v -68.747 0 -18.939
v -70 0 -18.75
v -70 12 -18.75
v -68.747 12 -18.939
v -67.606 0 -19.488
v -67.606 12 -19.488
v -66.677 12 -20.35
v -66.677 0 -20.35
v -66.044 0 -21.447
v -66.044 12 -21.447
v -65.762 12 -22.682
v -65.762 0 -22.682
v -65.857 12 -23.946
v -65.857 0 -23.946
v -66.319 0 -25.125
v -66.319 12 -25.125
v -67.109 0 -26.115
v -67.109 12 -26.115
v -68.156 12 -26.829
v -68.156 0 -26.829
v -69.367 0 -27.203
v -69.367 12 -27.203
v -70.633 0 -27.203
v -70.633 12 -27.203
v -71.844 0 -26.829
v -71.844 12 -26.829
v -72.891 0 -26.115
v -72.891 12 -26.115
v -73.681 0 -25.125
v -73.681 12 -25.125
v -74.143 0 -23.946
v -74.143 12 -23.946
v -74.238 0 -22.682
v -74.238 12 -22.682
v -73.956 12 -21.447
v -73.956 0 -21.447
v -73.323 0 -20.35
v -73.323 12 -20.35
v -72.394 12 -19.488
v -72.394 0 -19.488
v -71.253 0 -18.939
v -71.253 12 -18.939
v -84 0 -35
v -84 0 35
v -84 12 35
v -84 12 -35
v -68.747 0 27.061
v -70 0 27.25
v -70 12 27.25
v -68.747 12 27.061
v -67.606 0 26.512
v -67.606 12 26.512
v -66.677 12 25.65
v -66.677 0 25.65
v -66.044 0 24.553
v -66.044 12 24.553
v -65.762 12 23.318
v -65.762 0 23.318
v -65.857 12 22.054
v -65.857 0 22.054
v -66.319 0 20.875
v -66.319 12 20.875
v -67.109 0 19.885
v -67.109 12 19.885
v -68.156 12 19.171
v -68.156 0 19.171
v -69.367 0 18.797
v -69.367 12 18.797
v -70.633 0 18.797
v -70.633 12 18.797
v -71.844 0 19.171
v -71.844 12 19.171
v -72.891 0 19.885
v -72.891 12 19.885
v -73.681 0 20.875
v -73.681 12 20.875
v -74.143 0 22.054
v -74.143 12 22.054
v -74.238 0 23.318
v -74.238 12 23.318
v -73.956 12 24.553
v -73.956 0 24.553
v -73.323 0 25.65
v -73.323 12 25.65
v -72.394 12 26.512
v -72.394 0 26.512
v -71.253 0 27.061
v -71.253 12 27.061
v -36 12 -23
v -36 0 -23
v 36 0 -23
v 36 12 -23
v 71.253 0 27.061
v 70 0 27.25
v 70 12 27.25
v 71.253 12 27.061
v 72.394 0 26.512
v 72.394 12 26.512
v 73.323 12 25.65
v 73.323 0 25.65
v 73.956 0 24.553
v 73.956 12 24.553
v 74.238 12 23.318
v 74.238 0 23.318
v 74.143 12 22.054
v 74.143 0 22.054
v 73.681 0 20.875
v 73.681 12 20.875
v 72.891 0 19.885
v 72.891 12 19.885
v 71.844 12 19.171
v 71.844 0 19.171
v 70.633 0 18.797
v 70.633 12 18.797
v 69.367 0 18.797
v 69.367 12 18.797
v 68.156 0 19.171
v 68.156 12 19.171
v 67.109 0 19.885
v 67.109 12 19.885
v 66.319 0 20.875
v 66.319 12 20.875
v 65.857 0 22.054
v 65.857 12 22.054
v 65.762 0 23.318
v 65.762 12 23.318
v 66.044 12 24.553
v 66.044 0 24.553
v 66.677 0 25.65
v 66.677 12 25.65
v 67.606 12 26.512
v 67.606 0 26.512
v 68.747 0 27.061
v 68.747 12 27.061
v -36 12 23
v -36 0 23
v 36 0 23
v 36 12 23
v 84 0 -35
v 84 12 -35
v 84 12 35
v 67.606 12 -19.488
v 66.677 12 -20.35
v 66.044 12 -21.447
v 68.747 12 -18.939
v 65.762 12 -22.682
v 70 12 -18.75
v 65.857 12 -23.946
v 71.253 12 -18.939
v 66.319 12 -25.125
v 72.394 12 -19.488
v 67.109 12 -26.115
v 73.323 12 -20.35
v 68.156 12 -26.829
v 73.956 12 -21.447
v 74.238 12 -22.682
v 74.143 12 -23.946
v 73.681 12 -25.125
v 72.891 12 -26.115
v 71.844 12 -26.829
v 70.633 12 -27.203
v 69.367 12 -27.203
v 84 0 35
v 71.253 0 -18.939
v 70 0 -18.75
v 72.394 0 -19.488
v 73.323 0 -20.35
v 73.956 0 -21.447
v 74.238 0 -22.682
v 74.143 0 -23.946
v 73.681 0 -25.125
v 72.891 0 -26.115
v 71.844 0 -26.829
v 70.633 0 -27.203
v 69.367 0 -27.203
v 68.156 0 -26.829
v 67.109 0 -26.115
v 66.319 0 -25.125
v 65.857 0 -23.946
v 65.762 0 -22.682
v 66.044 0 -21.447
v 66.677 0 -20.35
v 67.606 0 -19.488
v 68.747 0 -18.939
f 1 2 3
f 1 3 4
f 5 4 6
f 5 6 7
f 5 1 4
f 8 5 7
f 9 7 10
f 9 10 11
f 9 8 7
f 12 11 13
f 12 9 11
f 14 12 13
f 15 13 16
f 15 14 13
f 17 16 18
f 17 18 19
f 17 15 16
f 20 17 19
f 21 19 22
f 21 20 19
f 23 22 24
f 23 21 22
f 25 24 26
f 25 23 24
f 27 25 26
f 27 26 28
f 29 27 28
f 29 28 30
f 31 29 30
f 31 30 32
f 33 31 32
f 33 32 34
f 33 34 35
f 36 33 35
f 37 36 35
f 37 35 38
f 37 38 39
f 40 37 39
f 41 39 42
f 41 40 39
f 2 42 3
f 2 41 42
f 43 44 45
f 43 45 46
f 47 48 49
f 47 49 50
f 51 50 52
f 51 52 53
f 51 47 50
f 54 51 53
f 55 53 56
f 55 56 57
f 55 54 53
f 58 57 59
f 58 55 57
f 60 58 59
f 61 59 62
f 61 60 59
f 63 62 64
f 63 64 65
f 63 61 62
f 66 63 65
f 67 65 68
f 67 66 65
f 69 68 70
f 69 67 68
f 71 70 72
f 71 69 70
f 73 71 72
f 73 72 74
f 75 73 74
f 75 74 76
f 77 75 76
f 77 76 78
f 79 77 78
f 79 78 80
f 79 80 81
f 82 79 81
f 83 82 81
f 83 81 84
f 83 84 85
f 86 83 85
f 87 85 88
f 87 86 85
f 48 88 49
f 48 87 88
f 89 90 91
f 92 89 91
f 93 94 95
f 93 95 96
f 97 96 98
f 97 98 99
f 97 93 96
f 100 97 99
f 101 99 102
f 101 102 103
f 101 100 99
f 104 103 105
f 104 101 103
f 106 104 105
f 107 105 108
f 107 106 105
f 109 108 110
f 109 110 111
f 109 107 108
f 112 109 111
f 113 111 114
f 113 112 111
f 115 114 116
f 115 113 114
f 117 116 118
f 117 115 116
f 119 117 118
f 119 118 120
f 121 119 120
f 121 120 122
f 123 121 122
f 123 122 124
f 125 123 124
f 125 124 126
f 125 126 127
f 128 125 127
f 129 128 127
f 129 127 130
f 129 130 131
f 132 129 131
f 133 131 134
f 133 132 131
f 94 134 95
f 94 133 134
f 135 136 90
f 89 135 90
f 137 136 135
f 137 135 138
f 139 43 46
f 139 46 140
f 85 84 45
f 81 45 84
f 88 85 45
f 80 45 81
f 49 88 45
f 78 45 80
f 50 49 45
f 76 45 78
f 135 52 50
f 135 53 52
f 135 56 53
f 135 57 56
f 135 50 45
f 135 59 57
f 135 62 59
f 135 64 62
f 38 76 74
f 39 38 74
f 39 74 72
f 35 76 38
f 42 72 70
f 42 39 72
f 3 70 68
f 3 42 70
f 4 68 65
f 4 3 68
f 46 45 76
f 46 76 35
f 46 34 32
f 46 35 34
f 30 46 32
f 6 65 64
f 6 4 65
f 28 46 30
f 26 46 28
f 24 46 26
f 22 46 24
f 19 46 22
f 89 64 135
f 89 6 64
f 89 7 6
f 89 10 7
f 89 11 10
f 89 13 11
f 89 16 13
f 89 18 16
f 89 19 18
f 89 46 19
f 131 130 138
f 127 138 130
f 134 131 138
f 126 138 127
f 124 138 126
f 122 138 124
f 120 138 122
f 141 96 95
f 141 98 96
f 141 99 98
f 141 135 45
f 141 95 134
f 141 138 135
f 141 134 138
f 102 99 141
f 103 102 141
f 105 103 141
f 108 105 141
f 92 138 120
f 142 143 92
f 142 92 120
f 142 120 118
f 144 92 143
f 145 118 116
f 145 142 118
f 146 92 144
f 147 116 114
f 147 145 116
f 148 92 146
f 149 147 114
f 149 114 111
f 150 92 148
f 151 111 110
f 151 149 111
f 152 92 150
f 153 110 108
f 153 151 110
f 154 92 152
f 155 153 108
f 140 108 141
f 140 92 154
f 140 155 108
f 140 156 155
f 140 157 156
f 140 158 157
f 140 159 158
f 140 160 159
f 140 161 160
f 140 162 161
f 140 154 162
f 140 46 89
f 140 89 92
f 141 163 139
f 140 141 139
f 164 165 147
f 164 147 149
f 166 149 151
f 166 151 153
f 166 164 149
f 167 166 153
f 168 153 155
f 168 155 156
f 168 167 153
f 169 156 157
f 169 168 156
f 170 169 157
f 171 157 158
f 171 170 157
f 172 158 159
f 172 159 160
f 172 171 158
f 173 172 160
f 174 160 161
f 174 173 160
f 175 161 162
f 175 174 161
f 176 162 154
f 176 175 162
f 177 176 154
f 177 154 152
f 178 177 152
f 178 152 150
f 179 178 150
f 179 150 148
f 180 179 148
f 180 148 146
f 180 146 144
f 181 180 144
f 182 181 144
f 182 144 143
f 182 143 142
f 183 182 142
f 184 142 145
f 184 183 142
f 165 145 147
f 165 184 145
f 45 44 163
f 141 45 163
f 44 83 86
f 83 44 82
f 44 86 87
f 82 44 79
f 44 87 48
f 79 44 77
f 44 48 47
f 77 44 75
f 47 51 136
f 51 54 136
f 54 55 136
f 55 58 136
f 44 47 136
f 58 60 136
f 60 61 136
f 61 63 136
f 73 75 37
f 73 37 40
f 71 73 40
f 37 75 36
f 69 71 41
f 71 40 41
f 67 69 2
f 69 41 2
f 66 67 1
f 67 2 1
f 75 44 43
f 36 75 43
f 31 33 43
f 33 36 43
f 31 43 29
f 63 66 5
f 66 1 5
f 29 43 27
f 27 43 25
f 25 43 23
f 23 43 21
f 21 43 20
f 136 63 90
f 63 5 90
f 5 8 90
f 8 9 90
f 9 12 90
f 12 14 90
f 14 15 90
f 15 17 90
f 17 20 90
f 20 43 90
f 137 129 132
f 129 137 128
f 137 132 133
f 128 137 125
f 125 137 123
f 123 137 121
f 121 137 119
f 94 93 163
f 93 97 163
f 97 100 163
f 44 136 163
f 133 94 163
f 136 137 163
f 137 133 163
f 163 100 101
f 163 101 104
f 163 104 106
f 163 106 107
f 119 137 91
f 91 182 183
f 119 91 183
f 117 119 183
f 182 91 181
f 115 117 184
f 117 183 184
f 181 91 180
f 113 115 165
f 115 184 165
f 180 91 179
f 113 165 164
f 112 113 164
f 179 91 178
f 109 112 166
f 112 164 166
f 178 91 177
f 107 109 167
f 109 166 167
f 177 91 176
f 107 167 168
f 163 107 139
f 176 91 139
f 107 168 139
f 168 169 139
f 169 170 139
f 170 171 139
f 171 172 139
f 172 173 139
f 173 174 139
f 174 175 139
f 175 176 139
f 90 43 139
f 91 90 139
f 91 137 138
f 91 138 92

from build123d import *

# Parameters (mm, degrees)
SKETCH1_W                  = 168
SKETCH1_H                  = 70
SKETCH1_R                  = 4.25
SKETCH1_W_2                = 72
SKETCH1_H_2                = 46
BRIDGE_CLAMP_EXTRUDE_DEPTH = 12


with BuildPart() as part:
    # Sketch1 → Bridge_Clamp_Extrude (new body)
    with BuildSketch(Plane(origin=(0, 0, 0), x_dir=(1, 0, 0), z_dir=(0, 1, 0))):
        Rectangle(SKETCH1_W, SKETCH1_H)
        with Locations(Location((-70, -23, 0), (0, 0, 270))):
            Circle(SKETCH1_R, mode=Mode.SUBTRACT)
        with Locations(Location((70, -23, 0), (0, 0, 270))):
            Circle(SKETCH1_R, mode=Mode.SUBTRACT)
        with Locations(Location((-70, 23, 0), (0, 0, 270))):
            Circle(SKETCH1_R, mode=Mode.SUBTRACT)
        with Locations(Location((70, 23, 0), (0, 0, 270))):
            Circle(SKETCH1_R, mode=Mode.SUBTRACT)
        Rectangle(SKETCH1_W_2, SKETCH1_H_2, mode=Mode.SUBTRACT)
    extrude(amount=BRIDGE_CLAMP_EXTRUDE_DEPTH)


solid = part.part
